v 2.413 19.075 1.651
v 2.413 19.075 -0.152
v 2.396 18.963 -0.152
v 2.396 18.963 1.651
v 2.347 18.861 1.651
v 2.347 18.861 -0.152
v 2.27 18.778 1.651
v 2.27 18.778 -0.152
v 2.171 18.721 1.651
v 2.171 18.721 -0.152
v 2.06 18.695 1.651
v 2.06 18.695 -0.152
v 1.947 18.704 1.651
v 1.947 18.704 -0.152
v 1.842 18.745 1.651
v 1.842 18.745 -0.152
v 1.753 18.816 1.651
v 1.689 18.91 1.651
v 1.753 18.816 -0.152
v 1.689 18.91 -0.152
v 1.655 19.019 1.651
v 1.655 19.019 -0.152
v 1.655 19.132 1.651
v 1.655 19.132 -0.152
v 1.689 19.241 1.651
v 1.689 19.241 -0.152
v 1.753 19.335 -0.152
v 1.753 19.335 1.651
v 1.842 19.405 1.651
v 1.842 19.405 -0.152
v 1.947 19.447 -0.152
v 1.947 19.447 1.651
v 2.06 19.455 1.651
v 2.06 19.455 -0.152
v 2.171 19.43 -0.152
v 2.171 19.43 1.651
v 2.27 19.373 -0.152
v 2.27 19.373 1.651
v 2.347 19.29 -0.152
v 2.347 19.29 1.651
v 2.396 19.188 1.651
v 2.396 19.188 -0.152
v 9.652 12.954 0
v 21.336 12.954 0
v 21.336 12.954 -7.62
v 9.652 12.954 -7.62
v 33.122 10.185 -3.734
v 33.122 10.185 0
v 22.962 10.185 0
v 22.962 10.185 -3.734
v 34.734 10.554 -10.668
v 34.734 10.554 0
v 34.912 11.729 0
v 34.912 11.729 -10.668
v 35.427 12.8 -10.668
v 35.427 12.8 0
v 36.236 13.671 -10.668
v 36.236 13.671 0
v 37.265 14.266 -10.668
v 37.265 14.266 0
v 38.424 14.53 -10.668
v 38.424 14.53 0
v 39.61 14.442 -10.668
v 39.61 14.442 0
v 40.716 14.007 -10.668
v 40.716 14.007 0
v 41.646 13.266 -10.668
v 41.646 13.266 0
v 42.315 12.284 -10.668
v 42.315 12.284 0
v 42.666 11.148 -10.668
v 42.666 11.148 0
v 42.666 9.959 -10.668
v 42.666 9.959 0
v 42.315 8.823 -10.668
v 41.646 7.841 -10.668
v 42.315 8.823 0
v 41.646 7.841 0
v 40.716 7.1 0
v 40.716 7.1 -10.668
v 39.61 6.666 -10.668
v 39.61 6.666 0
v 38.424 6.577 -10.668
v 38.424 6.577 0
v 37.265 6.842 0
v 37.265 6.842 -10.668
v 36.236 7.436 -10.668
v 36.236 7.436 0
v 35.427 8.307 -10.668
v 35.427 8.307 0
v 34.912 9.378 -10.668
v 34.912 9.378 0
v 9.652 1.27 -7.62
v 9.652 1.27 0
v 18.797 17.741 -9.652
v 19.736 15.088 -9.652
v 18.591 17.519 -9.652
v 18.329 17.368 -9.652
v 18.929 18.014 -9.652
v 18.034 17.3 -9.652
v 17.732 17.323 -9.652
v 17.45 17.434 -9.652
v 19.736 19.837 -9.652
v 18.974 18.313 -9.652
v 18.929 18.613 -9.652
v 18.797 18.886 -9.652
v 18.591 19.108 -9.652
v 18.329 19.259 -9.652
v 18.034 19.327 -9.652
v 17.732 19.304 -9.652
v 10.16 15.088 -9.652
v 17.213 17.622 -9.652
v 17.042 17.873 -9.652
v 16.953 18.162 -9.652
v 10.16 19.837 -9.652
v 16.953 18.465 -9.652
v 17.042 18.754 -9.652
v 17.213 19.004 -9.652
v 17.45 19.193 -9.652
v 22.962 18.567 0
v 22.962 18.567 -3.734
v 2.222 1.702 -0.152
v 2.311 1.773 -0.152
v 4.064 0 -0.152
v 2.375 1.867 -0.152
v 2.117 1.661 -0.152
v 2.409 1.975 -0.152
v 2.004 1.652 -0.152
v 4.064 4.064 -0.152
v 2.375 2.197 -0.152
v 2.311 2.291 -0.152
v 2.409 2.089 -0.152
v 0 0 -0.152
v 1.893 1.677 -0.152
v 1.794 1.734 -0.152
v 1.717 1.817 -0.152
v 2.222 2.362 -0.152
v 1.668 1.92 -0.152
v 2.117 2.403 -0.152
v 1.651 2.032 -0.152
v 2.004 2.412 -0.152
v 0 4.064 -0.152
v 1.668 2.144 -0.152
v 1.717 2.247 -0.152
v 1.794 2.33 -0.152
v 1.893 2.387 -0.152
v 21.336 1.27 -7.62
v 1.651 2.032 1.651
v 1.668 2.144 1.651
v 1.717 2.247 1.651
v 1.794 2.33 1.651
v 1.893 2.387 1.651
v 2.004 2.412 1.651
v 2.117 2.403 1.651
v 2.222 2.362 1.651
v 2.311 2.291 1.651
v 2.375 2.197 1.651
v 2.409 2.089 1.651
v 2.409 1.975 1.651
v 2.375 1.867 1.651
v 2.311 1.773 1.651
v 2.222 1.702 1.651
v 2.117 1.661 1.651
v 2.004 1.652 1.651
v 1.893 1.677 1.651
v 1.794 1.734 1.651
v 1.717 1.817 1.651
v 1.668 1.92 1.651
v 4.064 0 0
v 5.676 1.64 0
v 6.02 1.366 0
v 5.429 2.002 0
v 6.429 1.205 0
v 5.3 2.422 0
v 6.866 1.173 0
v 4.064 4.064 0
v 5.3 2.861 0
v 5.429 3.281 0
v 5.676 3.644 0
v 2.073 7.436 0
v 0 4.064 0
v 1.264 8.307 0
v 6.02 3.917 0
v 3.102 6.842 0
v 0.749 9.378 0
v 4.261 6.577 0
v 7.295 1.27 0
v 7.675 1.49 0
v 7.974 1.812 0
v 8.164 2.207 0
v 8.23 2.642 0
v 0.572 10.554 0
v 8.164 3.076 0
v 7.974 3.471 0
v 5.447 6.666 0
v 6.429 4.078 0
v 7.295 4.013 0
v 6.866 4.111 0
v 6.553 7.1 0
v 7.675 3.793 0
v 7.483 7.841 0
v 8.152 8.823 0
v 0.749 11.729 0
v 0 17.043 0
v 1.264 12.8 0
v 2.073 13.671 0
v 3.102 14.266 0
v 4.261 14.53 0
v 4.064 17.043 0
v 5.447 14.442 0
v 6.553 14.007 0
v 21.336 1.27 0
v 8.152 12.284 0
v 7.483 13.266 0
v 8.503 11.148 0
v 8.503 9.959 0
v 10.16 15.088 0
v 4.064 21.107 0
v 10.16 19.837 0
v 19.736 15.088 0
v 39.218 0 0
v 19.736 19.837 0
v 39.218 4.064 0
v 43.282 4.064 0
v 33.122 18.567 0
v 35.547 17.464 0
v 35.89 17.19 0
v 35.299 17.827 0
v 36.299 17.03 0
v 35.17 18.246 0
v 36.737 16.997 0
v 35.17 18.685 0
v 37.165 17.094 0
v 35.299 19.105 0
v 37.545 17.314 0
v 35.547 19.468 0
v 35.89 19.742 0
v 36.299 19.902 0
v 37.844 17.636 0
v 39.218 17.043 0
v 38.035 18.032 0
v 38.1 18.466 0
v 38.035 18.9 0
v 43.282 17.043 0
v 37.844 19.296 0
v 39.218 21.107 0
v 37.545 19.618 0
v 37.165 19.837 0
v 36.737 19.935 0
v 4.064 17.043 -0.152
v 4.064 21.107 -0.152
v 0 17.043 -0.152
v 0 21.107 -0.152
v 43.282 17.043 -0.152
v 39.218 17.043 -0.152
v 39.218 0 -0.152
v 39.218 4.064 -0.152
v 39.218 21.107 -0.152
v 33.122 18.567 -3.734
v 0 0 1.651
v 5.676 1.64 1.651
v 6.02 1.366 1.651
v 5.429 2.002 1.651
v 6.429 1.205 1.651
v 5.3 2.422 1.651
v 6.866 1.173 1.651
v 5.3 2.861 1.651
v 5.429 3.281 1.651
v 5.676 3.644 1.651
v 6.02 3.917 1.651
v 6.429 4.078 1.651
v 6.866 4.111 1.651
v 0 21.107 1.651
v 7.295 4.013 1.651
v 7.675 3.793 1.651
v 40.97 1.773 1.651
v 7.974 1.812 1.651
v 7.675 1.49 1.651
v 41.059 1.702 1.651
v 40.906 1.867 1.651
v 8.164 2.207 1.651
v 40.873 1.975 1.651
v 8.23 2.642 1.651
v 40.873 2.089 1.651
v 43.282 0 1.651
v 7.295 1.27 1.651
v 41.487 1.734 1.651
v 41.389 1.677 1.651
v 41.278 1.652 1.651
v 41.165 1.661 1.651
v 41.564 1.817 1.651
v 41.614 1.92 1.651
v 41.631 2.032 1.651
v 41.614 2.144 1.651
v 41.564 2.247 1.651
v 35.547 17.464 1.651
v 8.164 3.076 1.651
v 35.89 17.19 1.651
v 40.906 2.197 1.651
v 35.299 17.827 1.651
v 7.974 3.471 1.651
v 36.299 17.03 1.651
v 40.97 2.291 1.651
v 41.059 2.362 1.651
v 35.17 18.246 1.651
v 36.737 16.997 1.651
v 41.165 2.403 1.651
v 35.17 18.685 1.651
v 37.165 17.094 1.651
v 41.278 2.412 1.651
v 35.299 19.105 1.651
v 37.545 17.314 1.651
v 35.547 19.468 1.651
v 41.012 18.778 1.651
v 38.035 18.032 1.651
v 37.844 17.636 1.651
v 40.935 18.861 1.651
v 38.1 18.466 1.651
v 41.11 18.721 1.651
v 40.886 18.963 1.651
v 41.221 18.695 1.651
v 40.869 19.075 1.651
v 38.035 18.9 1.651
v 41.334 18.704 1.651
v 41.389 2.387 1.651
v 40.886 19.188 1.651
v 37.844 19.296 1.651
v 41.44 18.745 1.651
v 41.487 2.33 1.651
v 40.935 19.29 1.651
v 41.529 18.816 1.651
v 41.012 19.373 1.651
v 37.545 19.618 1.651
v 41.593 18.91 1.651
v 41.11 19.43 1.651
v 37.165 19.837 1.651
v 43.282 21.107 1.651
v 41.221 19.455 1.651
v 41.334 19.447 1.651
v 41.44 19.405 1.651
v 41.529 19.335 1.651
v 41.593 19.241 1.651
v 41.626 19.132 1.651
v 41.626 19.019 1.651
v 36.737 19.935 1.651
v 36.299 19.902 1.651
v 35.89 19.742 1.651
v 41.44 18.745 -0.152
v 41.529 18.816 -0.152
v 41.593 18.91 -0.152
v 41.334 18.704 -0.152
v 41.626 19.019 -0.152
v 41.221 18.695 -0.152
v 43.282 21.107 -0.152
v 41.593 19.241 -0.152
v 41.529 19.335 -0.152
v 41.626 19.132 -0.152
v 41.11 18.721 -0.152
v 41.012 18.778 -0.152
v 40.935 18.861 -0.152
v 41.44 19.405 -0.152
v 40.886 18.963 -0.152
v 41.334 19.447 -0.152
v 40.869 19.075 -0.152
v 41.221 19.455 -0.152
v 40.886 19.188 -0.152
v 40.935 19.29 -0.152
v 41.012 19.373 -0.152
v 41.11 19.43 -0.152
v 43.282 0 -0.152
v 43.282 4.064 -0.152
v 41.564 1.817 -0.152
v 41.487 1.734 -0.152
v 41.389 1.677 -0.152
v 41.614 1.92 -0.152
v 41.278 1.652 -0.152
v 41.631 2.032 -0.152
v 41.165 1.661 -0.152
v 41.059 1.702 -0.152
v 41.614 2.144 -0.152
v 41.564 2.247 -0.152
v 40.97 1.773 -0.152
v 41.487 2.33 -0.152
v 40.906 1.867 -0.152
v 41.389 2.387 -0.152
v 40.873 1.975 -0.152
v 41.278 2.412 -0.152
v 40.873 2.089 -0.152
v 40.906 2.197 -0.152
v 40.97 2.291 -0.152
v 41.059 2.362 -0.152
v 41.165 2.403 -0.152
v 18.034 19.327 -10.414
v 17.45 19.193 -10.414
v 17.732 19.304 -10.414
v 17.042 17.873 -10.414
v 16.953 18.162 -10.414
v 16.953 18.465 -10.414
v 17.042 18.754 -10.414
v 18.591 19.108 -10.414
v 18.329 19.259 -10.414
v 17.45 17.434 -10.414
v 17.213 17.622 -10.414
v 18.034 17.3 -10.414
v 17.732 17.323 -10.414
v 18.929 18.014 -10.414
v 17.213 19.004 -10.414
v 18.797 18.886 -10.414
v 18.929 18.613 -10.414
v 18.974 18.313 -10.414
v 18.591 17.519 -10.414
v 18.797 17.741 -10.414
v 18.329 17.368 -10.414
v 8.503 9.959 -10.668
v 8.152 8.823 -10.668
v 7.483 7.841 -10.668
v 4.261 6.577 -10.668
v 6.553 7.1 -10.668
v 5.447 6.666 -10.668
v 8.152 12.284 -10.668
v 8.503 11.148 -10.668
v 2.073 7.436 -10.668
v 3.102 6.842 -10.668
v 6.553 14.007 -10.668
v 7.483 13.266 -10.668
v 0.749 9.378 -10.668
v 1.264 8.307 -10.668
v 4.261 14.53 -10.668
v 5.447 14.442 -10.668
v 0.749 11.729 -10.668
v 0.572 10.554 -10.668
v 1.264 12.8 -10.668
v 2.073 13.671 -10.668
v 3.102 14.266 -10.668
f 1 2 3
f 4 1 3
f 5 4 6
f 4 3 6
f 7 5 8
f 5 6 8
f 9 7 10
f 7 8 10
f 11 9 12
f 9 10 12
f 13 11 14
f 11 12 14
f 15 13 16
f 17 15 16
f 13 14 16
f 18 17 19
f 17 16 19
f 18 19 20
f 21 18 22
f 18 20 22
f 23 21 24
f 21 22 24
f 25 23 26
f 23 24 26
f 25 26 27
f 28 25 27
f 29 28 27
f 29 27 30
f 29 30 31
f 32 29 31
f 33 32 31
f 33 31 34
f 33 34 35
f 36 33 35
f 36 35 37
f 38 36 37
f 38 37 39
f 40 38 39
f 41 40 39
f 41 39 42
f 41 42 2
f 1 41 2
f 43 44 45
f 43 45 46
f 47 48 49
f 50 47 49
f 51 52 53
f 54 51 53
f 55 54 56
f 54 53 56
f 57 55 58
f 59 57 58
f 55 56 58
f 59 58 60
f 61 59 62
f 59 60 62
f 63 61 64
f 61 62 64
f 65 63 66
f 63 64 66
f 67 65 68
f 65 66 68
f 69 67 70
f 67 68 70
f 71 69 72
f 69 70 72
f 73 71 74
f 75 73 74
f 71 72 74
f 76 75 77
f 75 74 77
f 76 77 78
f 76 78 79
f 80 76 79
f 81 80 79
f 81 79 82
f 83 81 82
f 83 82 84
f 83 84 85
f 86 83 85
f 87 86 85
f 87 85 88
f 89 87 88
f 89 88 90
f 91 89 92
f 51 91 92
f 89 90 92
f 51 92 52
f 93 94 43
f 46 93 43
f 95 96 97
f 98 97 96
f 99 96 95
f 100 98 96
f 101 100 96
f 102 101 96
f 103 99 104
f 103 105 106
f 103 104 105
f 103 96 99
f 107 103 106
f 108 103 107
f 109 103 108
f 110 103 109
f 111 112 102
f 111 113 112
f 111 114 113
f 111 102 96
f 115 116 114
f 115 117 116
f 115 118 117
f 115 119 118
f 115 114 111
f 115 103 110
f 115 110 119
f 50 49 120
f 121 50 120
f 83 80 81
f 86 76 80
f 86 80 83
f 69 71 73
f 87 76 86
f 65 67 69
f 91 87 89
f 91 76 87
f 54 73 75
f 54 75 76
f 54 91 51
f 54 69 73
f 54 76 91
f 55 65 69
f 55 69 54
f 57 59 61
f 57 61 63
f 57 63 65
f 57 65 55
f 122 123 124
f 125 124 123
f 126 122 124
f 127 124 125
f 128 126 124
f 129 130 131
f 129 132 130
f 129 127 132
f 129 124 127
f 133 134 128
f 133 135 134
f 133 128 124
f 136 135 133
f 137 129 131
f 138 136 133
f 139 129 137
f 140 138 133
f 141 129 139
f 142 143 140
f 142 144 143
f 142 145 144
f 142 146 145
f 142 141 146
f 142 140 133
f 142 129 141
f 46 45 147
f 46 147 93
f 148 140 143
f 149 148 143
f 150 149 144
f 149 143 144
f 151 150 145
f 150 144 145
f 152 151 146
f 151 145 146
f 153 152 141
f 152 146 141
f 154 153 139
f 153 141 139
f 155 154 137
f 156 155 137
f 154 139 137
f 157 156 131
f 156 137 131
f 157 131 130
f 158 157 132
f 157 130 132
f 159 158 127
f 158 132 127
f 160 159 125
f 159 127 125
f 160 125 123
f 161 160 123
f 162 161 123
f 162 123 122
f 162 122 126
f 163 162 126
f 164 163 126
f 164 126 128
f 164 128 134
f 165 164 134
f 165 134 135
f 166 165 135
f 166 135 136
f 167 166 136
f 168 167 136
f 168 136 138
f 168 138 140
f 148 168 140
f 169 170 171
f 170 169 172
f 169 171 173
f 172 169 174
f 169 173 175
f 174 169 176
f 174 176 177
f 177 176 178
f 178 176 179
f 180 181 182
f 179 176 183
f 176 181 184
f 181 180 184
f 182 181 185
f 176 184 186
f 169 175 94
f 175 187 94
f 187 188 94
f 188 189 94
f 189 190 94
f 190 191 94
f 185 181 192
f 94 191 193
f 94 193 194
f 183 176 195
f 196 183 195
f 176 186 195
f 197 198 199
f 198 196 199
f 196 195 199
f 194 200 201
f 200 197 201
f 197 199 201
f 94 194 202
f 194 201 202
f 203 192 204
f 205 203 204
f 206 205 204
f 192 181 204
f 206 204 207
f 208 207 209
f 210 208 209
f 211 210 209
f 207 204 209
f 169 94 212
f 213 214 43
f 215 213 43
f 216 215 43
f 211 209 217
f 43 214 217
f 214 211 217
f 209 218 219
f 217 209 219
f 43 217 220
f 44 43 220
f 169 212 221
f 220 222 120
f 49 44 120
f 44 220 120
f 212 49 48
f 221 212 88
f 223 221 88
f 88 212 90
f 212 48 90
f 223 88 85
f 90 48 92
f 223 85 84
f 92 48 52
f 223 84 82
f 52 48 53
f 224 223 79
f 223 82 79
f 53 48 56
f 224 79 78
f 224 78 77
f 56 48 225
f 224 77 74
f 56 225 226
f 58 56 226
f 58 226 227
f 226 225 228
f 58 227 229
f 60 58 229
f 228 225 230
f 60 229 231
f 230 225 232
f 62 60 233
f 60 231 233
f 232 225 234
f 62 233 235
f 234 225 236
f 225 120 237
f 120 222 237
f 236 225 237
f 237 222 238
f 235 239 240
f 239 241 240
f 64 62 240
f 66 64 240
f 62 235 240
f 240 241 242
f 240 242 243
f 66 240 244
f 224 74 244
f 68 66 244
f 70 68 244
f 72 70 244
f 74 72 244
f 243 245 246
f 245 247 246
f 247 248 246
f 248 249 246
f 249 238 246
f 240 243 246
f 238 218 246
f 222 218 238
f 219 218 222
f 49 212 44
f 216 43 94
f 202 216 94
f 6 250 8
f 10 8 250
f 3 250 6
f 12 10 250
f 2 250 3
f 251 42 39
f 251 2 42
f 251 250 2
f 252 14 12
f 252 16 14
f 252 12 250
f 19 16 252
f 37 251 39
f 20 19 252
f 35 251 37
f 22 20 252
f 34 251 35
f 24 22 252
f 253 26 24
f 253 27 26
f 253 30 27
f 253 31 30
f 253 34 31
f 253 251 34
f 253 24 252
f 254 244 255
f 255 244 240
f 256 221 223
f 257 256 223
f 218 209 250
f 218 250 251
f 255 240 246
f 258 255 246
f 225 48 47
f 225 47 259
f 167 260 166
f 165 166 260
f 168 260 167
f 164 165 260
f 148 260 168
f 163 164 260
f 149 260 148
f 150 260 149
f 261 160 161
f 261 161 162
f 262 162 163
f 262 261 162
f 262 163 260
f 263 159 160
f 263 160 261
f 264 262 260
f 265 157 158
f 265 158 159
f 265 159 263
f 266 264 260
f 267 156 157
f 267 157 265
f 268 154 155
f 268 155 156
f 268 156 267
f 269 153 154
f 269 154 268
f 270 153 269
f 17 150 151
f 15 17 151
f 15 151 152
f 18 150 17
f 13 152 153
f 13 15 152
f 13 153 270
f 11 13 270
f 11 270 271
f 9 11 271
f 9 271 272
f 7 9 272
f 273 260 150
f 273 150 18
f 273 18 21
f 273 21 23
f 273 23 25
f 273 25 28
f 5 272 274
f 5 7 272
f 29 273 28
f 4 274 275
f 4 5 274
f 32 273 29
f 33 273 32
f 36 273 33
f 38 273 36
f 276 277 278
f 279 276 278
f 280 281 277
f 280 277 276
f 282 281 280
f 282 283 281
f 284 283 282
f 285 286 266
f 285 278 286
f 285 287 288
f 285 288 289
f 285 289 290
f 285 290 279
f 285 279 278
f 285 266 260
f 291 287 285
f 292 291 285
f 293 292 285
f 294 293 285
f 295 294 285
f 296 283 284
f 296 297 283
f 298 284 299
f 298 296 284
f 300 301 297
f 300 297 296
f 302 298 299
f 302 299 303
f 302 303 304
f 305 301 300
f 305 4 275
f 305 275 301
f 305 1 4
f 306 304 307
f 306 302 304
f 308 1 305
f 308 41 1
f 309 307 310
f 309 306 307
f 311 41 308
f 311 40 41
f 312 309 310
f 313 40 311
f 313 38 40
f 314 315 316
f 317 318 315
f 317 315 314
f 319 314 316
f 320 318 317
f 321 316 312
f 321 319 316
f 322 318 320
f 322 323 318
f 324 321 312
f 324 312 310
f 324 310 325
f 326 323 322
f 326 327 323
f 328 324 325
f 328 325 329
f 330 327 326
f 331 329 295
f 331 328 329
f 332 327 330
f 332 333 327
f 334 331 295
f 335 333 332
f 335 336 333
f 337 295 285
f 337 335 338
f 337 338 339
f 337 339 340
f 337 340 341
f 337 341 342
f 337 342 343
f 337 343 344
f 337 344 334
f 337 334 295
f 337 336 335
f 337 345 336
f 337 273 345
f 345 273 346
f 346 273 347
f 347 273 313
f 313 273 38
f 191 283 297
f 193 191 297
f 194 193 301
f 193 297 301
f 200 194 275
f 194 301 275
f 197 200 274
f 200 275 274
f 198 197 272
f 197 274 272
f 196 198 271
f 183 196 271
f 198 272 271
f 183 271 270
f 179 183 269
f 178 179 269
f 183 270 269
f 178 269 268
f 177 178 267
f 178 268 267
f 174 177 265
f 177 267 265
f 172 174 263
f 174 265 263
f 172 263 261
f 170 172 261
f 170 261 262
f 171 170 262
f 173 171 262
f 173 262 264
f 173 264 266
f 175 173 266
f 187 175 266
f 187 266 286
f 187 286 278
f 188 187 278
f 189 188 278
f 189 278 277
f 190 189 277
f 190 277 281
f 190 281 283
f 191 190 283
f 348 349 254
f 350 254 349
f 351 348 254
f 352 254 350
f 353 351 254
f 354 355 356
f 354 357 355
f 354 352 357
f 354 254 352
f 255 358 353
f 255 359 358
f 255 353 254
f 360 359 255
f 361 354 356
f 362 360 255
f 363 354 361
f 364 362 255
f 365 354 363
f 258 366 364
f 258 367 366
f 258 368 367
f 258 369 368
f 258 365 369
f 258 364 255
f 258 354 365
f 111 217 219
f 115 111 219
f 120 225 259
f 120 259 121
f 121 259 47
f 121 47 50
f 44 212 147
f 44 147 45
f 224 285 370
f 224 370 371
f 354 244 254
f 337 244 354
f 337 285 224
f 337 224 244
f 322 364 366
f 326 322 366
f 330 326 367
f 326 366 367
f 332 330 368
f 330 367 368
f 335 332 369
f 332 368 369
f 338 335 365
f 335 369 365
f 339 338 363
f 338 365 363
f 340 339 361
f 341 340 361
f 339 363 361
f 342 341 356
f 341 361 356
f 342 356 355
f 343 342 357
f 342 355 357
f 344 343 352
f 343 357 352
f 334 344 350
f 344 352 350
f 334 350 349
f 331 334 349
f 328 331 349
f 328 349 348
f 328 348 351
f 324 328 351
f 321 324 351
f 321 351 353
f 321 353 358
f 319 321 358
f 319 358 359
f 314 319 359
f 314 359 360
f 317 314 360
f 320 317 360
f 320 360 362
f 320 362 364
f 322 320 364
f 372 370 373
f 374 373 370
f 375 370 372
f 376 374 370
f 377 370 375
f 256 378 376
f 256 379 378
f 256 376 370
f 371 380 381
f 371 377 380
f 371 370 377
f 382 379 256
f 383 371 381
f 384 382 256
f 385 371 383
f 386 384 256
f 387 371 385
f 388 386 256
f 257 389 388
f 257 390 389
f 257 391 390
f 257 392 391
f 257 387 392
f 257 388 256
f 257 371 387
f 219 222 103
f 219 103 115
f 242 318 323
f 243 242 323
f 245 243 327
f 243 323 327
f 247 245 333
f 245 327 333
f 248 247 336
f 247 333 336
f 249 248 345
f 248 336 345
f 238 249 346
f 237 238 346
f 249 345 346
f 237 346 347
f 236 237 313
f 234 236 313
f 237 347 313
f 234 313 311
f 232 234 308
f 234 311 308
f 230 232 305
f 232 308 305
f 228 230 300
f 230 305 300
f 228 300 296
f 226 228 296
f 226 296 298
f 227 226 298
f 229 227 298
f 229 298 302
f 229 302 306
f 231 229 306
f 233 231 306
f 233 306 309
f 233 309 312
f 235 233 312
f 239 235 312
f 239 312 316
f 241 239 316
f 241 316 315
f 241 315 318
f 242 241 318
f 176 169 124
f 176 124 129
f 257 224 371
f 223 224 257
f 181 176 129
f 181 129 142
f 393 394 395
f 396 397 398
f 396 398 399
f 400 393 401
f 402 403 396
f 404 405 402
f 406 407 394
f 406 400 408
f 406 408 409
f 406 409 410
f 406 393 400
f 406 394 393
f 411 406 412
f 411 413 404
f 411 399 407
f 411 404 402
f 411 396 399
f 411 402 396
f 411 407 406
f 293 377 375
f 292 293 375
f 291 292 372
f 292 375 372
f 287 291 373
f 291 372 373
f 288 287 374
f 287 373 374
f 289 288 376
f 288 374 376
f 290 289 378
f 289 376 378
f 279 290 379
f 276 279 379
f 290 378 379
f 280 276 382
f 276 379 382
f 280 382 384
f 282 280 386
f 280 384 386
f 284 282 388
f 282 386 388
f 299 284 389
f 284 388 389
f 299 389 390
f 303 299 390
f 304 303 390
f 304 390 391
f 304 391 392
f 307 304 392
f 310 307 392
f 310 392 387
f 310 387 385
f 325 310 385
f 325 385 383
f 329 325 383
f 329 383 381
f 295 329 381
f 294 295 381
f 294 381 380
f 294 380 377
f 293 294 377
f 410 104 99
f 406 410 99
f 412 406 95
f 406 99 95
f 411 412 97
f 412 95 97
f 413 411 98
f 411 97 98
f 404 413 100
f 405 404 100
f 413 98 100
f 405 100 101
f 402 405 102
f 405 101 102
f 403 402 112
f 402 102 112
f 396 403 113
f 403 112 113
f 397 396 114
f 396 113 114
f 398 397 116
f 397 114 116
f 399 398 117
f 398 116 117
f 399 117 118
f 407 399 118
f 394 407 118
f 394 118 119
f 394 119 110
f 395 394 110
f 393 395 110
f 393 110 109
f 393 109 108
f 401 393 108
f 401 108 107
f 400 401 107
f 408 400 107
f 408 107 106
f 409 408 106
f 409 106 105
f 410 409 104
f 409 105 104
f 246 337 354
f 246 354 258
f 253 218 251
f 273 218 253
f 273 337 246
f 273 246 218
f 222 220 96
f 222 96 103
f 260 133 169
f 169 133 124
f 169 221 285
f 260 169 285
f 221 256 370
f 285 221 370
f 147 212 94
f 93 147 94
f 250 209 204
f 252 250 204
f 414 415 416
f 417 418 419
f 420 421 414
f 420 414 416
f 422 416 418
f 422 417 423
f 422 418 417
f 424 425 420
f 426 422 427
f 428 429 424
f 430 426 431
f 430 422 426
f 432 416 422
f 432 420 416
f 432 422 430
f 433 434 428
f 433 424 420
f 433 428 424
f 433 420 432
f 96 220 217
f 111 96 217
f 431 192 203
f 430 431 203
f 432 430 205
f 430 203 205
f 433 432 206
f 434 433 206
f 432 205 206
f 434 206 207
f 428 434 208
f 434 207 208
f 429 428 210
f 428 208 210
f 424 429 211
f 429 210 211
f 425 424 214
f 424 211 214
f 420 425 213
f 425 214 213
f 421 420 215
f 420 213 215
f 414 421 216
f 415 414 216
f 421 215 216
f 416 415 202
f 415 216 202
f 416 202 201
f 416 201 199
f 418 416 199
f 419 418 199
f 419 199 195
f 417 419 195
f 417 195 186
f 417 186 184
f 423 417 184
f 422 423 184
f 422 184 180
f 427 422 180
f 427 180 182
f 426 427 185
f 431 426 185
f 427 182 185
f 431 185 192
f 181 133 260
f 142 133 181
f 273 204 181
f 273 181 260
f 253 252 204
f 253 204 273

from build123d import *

# Parameters (mm, degrees)
SKETCH1_W           = 43.2816
SKETCH1_H           = 21.1074
BOSS_EXTRUDE1_DEPTH = 1.651
SKETCH2_R           = 1.4732
CUT_EXTRUDE1_DEPTH  = 49.18241416
SKETCH3_R           = 3.9878
BOSS_EXTRUDE2_DEPTH = 10.668
SKETCH4_W           = 10.16
SKETCH4_H           = 8.382
BOSS_EXTRUDE3_DEPTH = 3.7338
SKETCH4_3_W         = 11.684
SKETCH4_3_H         = 11.684
BOSS_EXTRUDE4_DEPTH = 7.62
SKETCH4_4_W         = 9.5758
SKETCH4_4_H         = 4.7498
BOSS_EXTRUDE5_DEPTH = 9.652
SKETCH5_R           = 1.016
BOSS_EXTRUDE6_DEPTH = 0.762
SKETCH6_W           = 4.064
SKETCH6_H           = 4.064
BOSS_EXTRUDE7_DEPTH = 0.1524
SKETCH7_R           = 0.381
CUT_EXTRUDE2_DEPTH  = 50.288914339


with BuildPart() as part:
    # Sketch1 → Boss-Extrude1 (new body)
    with BuildSketch(Plane.XY):
        with Locations((21.6408, 10.5537)):
            Rectangle(SKETCH1_W, SKETCH1_H)
    extrude(amount=BOSS_EXTRUDE1_DEPTH)

    # Sketch2 → Cut-Extrude1 (cut, through all)
    with BuildSketch(Plane.XY.offset(1.651)):
        with Locations((36.6268, 18.4658)):
            Circle(SKETCH2_R)
        with Locations((6.7564, 2.6416)):
            Circle(SKETCH2_R)
    extrude(amount=-CUT_EXTRUDE1_DEPTH, mode=Mode.SUBTRACT)

    # Sketch3 → Boss-Extrude2 (add)
    with BuildSketch(Plane(origin=(0, 0, 0), x_dir=(-1, 0, 0), z_dir=(0, 0, -1))):
        with Locations((-4.5593, 10.5537)):
            Circle(SKETCH3_R)
        with Locations((-38.7223, 10.5537)):
            Circle(SKETCH3_R)
    extrude(amount=BOSS_EXTRUDE2_DEPTH)

    # Sketch4 → Boss-Extrude3 (add)
    with BuildSketch(Plane(origin=(0, 0, 0), x_dir=(-1, 0, 0), z_dir=(0, 0, -1))):
        with Locations((-28.0416, 14.3764)):
            Rectangle(SKETCH4_W, SKETCH4_H)
    extrude(amount=BOSS_EXTRUDE3_DEPTH)

    # Sketch4<3> → Boss-Extrude4 (add)
    with BuildSketch(Plane(origin=(0, 0, 0), x_dir=(-1, 0, 0), z_dir=(0, 0, -1))):
        with Locations((-15.494, 7.112)):
            Rectangle(SKETCH4_3_W, SKETCH4_3_H)
    extrude(amount=BOSS_EXTRUDE4_DEPTH)

    # Sketch4<4> → Boss-Extrude5 (add)
    with BuildSketch(Plane(origin=(0, 0, 0), x_dir=(-1, 0, 0), z_dir=(0, 0, -1))):
        with Locations((-14.9479, 17.4625)):
            Rectangle(SKETCH4_4_W, SKETCH4_4_H)
    extrude(amount=BOSS_EXTRUDE5_DEPTH)

    # Sketch5 → Boss-Extrude6 (add)
    with BuildSketch(Plane(origin=(0, 0, -9.652), x_dir=(-1, 0, 0), z_dir=(0, 0, -1))):
        with Locations((-17.9578, 18.3134)):
            Circle(SKETCH5_R)
    extrude(amount=BOSS_EXTRUDE6_DEPTH)

    # Sketch6 → Boss-Extrude7 (add)
    with BuildSketch(Plane(origin=(0, 0, 0), x_dir=(-1, 0, 0), z_dir=(0, 0, -1))):
        with Locations((-41.2496, 19.0754)):
            Rectangle(SKETCH6_W, SKETCH6_H)
        with Locations((-41.2496, 2.032)):
            Rectangle(SKETCH6_W, SKETCH6_H)
        with Locations((-2.032, 19.0754)):
            Rectangle(SKETCH6_W, SKETCH6_H)
        with Locations((-2.032, 2.032)):
            Rectangle(SKETCH6_W, SKETCH6_H)
    extrude(amount=BOSS_EXTRUDE7_DEPTH)

    # Sketch7 → Cut-Extrude2 (cut, through all)
    with BuildSketch(Plane(origin=(0, 0, -0.1524), x_dir=(-1, 0, 0), z_dir=(0, 0, -1))):
        with Locations((-41.2496, 19.0754)):
            Circle(SKETCH7_R)
        with Locations((-2.032, 19.0754)):
            Circle(SKETCH7_R)
        with Locations((-2.032, 2.032)):
            Circle(SKETCH7_R)
        with Locations((-41.2496, 2.032)):
            Circle(SKETCH7_R)
    extrude(amount=-CUT_EXTRUDE2_DEPTH, mode=Mode.SUBTRACT)


solid = part.part
